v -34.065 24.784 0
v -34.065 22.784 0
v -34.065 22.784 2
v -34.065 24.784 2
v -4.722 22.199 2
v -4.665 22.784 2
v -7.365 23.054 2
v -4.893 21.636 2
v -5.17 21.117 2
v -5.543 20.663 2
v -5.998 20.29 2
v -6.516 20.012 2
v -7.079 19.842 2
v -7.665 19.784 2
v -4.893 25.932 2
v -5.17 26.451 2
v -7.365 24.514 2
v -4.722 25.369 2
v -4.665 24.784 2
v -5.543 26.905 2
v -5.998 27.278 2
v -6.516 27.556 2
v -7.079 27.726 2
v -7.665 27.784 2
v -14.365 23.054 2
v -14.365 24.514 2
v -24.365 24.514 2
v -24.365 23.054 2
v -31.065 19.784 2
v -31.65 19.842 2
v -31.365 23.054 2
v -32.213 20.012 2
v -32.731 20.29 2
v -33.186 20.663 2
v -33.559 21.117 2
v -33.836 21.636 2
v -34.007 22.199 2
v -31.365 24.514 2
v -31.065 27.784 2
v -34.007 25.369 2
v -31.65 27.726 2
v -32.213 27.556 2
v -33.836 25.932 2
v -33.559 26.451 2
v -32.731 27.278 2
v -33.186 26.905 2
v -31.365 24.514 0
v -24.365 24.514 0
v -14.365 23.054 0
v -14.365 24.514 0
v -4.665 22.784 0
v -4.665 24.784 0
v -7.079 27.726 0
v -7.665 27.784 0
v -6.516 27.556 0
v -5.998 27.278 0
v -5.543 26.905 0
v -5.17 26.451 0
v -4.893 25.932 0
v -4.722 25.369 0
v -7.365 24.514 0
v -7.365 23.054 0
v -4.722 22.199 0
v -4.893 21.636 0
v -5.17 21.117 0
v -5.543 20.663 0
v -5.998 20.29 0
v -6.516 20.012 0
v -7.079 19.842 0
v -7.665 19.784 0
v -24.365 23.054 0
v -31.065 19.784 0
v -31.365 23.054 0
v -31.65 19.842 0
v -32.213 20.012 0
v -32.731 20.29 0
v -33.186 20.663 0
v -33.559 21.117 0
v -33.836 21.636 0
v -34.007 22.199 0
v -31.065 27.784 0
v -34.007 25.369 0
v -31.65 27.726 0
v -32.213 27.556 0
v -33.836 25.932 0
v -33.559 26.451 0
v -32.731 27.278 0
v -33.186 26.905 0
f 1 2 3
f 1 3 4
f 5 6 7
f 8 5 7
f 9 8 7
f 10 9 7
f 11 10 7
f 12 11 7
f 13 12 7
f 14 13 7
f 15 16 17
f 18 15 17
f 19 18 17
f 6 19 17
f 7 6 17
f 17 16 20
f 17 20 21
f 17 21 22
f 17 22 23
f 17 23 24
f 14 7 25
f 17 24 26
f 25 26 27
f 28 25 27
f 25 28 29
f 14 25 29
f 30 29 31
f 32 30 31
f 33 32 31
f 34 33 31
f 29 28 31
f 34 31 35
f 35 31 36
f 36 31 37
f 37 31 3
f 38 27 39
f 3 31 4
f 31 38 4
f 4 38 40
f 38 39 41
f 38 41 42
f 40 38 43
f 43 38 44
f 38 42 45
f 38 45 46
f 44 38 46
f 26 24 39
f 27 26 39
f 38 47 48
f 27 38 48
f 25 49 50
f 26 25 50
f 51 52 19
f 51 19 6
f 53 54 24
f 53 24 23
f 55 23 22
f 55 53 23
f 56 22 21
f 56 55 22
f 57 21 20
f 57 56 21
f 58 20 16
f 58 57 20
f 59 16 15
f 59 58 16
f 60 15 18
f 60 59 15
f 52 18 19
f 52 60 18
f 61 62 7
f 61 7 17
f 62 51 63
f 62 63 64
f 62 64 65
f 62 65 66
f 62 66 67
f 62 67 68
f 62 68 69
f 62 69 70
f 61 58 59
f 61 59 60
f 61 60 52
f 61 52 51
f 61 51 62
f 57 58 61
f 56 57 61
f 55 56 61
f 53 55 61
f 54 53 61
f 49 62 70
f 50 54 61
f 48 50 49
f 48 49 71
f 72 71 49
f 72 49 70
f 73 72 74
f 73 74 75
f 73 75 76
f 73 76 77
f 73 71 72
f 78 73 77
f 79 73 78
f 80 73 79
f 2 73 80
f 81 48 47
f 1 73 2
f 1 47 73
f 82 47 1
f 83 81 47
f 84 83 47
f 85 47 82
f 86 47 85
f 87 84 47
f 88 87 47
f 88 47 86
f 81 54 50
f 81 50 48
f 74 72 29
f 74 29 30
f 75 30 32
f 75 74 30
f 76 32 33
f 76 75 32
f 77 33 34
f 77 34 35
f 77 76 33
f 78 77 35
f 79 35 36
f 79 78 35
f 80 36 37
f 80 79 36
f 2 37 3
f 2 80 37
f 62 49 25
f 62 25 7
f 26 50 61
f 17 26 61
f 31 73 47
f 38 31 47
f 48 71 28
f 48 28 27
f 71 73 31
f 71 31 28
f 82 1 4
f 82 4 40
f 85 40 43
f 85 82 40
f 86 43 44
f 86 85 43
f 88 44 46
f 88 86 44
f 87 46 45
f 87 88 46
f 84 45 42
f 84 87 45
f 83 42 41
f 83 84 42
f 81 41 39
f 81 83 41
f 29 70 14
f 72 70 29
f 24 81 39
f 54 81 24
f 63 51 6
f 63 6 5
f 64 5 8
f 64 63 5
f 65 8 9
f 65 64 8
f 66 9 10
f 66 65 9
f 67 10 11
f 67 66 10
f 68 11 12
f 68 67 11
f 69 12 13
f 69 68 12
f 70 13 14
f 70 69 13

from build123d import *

# Parameters (mm, degrees)
SKETCH1_W           = 7
SKETCH1_H           = 1.46
BOSS_EXTRUDE1_DEPTH = 2


with BuildPart() as part:
    # Sketch1 → Boss-Extrude1 (new body)
    with BuildSketch(Plane.XY):
        with BuildLine():
            Line((-31.064544979, 27.784009845), (-7.664544979, 27.784009845))
            ThreePointArc((-7.664544979, 27.784009845), (-5.543224635, 26.905330188), (-4.664544979, 24.784009845))
            Line((-4.664544979, 24.784009845), (-4.664544979, 22.784009845))
            ThreePointArc((-4.664544979, 22.784009845), (-5.543224635, 20.662689501), (-7.664544979, 19.784009845))
            Line((-7.664544979, 19.784009845), (-31.064544979, 19.784009845))
            ThreePointArc((-31.064544979, 19.784009845), (-33.185865322, 20.662689501), (-34.064544979, 22.784009845))
            Line((-34.064544979, 22.784009845), (-34.064544979, 24.784009845))
            ThreePointArc((-34.064544979, 24.784009845), (-33.185865322, 26.905330188), (-31.064544979, 27.784009845))
        make_face()
        with Locations((-27.864544979, 23.784009845)):
            Rectangle(SKETCH1_W, SKETCH1_H, mode=Mode.SUBTRACT)
        with Locations((-10.864544979, 23.784009845)):
            Rectangle(SKETCH1_W, SKETCH1_H, mode=Mode.SUBTRACT)
    extrude(amount=BOSS_EXTRUDE1_DEPTH)


solid = part.part
